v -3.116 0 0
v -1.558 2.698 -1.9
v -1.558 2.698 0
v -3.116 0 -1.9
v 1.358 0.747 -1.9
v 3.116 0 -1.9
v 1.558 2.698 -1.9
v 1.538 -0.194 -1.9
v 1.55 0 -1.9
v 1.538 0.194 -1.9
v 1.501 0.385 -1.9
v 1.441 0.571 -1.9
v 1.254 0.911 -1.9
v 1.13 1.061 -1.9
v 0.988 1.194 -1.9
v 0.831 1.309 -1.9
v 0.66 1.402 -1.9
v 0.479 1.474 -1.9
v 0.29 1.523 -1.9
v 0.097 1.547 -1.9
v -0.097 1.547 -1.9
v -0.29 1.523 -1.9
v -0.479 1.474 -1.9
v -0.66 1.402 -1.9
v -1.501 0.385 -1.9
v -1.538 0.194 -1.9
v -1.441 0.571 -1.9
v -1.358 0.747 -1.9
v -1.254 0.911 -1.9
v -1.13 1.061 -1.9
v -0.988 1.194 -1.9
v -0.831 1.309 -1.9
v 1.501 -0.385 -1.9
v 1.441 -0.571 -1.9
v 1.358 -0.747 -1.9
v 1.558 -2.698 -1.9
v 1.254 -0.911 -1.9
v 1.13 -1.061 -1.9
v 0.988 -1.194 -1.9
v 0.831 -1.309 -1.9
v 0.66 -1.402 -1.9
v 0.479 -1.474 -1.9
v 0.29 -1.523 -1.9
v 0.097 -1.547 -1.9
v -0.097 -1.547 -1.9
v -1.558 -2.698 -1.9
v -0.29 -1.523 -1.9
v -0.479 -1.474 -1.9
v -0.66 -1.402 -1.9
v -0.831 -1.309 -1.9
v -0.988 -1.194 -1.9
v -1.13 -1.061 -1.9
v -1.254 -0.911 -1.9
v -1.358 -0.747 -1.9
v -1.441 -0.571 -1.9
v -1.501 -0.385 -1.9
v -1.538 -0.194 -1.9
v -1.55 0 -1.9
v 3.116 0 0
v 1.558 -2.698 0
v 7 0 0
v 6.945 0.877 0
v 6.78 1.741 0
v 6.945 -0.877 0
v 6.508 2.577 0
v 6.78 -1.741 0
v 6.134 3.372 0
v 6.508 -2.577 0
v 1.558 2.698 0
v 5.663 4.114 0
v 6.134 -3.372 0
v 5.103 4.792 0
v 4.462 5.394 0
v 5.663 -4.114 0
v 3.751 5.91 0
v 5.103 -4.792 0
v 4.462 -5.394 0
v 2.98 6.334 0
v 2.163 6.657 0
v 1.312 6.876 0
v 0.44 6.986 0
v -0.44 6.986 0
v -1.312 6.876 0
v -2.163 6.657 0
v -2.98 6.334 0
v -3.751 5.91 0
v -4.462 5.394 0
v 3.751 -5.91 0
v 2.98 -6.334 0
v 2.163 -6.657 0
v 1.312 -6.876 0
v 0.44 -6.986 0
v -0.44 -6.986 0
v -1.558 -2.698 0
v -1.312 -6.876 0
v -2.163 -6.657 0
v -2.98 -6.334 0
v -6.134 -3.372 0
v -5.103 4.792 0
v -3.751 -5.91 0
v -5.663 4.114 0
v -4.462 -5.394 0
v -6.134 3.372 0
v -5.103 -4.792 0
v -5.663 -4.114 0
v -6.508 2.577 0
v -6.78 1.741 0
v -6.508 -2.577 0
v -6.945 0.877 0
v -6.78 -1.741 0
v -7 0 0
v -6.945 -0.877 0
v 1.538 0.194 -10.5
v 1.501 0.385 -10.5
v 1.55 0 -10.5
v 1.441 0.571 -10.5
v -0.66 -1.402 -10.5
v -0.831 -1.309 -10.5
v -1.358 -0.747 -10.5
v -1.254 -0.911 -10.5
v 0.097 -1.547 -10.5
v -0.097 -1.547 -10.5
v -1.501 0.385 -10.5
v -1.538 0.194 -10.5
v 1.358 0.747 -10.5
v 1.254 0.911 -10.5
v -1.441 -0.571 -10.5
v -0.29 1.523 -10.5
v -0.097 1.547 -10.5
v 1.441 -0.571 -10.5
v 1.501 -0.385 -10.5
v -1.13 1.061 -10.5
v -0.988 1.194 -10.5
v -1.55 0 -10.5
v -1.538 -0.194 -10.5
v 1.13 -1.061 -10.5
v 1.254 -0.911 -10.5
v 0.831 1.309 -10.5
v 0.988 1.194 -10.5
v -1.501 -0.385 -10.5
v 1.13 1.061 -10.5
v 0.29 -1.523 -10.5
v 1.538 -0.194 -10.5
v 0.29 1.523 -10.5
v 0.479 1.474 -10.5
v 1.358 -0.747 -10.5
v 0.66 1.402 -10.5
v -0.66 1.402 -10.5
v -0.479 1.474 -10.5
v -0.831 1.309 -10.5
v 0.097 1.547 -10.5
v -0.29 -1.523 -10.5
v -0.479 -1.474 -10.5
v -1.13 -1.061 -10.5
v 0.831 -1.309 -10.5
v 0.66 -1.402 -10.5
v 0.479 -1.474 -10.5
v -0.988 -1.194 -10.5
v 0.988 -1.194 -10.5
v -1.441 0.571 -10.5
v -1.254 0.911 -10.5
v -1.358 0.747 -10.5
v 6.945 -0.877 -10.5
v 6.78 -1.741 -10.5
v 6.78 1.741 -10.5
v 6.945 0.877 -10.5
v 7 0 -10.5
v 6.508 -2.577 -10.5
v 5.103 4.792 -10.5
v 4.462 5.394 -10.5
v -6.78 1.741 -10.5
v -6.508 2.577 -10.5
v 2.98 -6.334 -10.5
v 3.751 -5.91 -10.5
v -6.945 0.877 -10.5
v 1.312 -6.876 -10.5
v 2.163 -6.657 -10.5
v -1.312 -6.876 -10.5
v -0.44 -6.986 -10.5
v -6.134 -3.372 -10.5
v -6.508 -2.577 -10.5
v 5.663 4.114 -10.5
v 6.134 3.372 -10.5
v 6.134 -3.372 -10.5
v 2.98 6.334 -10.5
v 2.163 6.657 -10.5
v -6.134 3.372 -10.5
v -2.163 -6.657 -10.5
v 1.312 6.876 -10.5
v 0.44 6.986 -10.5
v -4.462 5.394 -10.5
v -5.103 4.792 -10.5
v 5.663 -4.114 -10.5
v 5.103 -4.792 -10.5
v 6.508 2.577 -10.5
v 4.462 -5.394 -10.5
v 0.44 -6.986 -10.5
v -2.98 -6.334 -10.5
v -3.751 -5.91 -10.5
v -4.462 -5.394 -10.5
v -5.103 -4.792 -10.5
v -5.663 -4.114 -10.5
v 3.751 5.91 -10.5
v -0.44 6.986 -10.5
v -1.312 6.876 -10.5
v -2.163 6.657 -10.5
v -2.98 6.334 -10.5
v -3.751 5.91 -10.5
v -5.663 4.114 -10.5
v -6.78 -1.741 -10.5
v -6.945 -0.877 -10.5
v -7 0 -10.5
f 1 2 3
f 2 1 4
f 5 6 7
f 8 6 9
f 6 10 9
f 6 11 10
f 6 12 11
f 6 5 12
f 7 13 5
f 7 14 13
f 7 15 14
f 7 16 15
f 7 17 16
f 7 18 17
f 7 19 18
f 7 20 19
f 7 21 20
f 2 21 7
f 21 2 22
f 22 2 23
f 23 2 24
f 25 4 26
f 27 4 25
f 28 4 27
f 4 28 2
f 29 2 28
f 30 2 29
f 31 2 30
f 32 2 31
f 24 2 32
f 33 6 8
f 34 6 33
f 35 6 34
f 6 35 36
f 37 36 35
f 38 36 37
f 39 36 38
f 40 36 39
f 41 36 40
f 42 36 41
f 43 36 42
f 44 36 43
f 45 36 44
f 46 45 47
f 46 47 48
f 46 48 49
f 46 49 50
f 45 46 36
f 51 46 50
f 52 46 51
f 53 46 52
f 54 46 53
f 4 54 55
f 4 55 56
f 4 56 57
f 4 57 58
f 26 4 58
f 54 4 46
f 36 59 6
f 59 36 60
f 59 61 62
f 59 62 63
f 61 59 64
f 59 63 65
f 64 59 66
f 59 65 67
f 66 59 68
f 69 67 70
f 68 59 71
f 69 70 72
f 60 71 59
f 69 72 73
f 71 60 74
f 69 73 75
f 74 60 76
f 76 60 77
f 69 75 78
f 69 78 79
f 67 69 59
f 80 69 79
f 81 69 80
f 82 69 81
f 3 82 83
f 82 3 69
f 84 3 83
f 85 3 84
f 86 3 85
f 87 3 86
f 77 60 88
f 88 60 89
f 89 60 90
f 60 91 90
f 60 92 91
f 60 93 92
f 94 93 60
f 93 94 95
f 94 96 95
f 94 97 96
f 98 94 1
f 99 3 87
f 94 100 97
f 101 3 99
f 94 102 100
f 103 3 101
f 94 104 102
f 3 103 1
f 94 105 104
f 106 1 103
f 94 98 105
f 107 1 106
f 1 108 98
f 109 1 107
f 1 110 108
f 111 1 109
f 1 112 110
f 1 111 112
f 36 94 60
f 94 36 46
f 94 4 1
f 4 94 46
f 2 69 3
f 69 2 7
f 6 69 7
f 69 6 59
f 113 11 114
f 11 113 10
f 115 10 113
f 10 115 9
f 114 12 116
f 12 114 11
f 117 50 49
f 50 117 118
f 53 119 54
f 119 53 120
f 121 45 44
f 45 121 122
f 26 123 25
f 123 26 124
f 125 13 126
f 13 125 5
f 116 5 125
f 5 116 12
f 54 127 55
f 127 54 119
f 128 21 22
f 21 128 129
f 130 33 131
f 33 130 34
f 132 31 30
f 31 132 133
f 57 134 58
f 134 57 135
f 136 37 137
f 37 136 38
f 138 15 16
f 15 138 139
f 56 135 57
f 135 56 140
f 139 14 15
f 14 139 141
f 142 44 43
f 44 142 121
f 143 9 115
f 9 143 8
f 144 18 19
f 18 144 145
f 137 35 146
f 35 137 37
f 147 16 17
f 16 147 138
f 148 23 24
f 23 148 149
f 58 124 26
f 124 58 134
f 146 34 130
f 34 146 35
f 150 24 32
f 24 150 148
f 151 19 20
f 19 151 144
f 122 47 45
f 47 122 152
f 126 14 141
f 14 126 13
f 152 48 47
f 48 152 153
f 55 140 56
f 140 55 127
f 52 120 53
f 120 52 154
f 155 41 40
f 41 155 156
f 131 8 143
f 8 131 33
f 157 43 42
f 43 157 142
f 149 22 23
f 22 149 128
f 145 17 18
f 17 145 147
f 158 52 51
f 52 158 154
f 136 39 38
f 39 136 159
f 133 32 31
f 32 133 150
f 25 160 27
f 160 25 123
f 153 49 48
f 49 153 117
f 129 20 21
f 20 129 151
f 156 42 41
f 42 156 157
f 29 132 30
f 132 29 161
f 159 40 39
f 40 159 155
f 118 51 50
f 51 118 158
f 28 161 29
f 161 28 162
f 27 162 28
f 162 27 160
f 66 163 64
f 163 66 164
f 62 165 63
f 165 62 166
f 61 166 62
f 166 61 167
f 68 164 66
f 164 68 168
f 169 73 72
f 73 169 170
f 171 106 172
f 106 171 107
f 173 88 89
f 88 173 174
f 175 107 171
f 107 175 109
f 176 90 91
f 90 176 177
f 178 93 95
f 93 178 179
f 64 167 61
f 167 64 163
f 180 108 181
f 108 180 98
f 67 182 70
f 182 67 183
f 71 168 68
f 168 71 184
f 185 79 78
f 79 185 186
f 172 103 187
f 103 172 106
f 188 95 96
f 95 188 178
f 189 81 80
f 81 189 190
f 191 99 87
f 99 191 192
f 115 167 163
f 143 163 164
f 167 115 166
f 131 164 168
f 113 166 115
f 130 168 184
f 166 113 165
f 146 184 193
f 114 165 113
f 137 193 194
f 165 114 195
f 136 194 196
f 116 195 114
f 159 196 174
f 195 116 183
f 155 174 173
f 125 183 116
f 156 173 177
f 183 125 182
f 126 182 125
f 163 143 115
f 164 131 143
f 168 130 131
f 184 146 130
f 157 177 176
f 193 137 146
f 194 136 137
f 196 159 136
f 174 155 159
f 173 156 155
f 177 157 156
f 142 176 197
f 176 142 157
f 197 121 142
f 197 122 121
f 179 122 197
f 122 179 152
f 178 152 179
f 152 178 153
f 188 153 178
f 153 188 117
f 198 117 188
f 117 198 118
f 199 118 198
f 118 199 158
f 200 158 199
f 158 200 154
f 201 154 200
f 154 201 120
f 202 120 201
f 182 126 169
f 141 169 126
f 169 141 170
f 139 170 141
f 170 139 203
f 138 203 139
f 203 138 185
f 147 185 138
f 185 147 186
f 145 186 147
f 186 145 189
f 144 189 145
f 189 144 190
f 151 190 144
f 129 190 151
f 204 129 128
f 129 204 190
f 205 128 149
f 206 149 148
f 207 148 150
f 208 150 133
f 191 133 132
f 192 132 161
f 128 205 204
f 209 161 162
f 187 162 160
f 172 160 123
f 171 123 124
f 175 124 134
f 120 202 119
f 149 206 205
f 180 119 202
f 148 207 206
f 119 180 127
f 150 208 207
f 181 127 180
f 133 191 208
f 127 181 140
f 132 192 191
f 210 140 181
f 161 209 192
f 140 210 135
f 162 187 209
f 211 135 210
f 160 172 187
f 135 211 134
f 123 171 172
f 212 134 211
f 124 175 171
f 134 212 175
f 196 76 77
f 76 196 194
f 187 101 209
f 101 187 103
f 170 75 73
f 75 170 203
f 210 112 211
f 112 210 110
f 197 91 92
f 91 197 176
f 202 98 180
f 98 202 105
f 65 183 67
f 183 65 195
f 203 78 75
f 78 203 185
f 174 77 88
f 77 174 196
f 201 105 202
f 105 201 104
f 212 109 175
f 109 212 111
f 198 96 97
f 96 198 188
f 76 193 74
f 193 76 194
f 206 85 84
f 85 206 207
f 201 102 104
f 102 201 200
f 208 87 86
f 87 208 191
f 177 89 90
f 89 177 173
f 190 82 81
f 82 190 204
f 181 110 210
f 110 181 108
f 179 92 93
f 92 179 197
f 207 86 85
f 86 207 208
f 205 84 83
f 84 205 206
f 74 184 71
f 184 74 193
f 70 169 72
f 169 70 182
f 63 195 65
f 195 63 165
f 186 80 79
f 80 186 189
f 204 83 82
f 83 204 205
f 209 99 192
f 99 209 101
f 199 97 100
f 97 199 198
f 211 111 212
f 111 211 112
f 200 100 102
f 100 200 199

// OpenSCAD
$fn = 50;

difference() {
	union() {
		translate(v = [0, 0, -10.5]) {
			cylinder(h = 10.5, r = 7.0);
		}
	}
	union() {
		translate(v = [0, 0, 0]) {
			rotate(a = [0, 0, 0]) {
				difference() {
					union() {
						translate(v = [0, 0, -1.9]) {
							linear_extrude(height = 1.9) {
								polygon(points = [[3.1158, 0.0], [1.5579000000000005, 2.698361953111554], [-1.5578999999999994, 2.6983619531115544], [-3.1158, 3.815754496783323e-16], [-1.5579000000000014, -2.6983619531115535], [1.557899999999998, -2.6983619531115552]]);
							}
						}
					}
					union();
				}
			}
		}
		#translate(v = [0, 0, -100.0]) {
			cylinder(h = 200, r = 1.55);
		}
	}
}
